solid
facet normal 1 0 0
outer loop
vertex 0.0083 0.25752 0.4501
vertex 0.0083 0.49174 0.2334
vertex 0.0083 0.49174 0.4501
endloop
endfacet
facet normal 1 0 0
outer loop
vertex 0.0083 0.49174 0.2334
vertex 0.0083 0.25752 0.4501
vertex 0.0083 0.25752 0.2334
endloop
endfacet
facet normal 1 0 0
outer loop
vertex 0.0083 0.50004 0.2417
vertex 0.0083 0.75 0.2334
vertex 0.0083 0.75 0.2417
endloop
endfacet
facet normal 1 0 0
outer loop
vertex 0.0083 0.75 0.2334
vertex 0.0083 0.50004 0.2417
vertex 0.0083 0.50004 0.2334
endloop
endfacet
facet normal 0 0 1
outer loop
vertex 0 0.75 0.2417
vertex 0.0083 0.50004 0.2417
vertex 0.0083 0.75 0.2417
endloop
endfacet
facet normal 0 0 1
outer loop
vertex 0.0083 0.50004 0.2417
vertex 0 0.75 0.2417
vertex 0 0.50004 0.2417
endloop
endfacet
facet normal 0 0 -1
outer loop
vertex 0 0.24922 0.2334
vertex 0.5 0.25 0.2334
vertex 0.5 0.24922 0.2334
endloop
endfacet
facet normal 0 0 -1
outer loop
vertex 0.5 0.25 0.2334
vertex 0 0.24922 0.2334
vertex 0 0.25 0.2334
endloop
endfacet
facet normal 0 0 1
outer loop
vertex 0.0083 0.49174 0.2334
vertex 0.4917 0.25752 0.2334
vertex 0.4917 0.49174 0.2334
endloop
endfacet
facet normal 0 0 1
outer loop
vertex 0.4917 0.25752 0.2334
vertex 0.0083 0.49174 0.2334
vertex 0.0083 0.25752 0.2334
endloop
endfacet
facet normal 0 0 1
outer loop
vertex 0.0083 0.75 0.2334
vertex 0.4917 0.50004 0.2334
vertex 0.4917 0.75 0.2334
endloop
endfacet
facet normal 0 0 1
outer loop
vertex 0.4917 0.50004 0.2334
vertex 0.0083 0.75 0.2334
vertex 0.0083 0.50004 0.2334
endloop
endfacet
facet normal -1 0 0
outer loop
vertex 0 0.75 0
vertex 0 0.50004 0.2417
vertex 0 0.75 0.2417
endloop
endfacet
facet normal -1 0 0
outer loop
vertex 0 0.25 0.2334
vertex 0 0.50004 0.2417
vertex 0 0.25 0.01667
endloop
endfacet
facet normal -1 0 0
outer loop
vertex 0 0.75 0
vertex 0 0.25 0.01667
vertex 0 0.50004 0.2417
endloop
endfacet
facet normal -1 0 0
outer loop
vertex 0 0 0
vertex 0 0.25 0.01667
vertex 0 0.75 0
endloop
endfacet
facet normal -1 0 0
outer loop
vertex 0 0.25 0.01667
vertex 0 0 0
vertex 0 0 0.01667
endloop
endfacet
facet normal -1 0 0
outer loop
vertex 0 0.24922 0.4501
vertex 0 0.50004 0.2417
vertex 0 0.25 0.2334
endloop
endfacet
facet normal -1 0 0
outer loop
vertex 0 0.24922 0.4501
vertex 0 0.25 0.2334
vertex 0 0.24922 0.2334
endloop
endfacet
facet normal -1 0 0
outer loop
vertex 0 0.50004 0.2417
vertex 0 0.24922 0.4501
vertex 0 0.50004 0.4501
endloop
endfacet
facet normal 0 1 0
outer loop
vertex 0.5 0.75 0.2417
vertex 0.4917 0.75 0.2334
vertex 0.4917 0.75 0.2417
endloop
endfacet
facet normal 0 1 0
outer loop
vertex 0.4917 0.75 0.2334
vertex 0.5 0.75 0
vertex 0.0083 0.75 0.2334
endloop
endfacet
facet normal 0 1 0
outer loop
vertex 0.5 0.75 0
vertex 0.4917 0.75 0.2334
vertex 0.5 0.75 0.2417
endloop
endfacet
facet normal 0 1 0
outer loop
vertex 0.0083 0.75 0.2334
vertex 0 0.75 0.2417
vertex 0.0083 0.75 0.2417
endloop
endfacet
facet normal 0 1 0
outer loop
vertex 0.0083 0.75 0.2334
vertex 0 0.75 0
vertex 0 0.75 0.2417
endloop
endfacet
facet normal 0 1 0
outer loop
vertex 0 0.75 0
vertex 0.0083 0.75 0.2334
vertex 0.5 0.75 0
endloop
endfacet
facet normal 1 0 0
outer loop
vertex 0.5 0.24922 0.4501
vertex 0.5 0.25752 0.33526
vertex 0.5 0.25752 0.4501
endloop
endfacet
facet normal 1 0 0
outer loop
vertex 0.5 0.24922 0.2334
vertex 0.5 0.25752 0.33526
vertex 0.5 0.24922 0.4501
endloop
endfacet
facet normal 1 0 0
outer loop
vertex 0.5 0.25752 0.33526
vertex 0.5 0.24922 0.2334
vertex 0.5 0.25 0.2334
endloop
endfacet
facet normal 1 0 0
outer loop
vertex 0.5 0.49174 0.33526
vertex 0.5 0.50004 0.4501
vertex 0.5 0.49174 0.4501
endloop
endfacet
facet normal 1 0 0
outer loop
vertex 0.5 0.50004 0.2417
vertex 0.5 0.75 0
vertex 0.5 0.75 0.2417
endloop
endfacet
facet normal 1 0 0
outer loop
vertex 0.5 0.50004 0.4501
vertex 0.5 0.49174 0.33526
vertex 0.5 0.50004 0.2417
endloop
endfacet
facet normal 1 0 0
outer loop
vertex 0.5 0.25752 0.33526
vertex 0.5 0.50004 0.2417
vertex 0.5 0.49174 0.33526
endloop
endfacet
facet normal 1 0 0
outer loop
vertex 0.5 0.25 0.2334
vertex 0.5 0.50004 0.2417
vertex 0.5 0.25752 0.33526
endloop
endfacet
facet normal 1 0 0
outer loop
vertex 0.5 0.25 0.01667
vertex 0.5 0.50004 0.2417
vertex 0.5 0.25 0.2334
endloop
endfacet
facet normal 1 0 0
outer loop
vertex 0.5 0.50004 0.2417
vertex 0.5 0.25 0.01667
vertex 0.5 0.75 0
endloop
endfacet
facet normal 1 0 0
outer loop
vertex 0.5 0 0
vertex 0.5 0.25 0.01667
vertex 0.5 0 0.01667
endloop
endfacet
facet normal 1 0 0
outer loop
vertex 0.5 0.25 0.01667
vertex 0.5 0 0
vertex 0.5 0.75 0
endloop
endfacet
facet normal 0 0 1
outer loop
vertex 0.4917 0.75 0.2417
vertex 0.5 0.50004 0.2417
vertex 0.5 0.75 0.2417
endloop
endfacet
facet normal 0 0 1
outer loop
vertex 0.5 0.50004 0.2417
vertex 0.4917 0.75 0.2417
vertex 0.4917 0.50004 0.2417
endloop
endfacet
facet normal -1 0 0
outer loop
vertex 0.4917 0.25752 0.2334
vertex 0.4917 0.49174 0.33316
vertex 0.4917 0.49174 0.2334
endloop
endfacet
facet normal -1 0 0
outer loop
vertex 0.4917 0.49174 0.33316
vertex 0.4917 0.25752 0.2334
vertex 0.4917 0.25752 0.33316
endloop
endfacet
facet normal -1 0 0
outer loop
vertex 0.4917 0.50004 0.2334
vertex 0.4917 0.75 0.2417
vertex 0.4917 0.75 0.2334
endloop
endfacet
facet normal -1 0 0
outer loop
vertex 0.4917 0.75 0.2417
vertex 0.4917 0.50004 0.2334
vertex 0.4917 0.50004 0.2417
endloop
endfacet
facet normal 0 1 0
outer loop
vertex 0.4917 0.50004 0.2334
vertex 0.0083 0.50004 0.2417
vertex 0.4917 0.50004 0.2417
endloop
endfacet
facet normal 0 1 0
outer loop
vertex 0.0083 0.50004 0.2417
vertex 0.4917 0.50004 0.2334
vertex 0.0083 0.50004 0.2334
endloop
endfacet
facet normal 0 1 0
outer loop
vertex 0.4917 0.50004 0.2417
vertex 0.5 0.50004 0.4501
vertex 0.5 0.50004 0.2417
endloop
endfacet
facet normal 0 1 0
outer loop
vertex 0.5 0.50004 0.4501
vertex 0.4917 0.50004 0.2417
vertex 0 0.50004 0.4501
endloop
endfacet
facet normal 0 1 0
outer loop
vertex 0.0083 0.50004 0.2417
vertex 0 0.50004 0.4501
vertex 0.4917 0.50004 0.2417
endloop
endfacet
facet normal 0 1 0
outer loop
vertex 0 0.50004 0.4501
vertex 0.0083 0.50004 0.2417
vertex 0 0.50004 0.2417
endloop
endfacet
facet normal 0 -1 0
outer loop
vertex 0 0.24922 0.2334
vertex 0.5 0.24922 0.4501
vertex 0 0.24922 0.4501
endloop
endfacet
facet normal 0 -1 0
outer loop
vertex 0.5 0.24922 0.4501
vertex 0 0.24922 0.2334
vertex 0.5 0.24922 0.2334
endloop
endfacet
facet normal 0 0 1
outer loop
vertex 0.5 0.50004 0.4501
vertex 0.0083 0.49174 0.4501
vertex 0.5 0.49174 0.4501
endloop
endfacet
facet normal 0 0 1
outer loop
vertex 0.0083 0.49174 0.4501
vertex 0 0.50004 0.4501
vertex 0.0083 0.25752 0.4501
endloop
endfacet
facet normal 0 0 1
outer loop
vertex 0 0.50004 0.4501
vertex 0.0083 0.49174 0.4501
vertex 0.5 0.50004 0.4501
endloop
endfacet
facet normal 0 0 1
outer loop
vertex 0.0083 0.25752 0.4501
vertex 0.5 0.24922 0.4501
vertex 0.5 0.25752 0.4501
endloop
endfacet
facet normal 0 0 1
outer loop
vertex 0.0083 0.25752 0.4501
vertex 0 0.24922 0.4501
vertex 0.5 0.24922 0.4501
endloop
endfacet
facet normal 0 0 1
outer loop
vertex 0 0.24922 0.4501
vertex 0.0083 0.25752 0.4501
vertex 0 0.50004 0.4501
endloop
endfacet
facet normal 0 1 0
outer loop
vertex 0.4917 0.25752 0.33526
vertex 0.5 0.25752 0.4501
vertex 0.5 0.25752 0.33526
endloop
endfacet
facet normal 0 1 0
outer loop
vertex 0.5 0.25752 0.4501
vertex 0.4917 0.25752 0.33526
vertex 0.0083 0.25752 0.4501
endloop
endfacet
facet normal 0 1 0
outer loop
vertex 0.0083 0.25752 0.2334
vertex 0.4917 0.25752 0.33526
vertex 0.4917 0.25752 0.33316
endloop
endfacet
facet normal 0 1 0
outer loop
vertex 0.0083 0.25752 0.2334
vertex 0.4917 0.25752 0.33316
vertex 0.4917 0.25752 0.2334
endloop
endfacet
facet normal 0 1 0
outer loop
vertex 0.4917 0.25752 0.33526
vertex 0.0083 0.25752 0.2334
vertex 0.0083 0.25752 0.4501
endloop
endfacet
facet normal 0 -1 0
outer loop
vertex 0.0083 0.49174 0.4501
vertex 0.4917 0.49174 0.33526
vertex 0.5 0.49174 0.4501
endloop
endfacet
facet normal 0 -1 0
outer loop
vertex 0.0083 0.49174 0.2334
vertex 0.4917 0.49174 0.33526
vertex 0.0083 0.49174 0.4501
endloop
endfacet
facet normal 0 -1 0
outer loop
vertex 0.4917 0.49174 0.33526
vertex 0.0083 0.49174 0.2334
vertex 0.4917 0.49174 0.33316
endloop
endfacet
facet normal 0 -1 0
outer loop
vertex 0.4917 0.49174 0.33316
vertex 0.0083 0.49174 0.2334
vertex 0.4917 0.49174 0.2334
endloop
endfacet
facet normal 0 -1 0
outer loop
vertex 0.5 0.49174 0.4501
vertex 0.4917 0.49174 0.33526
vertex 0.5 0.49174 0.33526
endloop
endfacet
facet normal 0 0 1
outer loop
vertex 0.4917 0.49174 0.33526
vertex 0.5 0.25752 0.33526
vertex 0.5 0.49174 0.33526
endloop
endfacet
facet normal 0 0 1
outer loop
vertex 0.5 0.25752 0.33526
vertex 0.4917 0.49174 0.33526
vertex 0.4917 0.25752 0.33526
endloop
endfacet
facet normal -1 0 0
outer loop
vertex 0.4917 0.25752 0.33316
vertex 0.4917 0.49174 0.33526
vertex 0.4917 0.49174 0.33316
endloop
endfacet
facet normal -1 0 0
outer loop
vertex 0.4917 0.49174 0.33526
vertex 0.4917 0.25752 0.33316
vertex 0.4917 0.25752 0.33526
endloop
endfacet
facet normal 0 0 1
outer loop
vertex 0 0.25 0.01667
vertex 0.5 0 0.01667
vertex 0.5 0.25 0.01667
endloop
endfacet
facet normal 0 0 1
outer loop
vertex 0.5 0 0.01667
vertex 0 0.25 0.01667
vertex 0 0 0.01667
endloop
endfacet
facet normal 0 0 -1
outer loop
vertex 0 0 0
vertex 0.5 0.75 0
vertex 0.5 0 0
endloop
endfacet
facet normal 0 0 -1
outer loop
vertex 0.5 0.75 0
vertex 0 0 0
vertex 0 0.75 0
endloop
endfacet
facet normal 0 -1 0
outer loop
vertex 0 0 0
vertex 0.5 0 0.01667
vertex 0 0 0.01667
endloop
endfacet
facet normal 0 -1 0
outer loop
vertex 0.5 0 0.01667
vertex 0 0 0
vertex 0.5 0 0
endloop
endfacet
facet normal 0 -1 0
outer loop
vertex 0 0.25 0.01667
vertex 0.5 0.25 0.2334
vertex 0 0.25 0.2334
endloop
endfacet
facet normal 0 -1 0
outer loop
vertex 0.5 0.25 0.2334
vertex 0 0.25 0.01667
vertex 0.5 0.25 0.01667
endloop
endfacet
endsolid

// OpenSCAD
// === Parameters ===

// Base reference slab
base_length    = 0.5;
base_width     = 0.75;
base_height    = 0.016667;

// Rear solid rectangular block (upper-side feature)
block_length   = 0.5;       // flush left & right
block_width    = 0.5;       // flush back, offset 0.25 from front
block_y_offset = 0.25;      // front-edge offset
block_reach    = 0.2334;    // total z from base datum

// Narrow edge strips atop rear block
strip_w        = 0.0083;    // x-width of each strip
strip_l        = 0.5;       // y-length (matches block_width)
strip_h        = 0.0083;    // z-extrusion depth

// Thin transverse plate
plate_length   = 0.5;       // x-extent, flush left & right
plate_width    = 0.250819;  // y-extent
plate_y_offset = 0.24922;   // offset from front edge
plate_thickness= 0.0021;    // own z-thickness
plate_reach    = 0.335265;  // top-surface z from base datum

// Frame wall thickness (matches strip width)
wall_t         = 0.0083;

// Stepped portion depths measured from shoulder (block top)
upper_pad_depth = 0.1;      // all 4 walls (shallow footprint)
deeper_depth    = 0.2167;   // left, front, back walls only

// === Derived Values ===
block_height   = block_reach - base_height;
plate_z_bottom = plate_reach - plate_thickness;
shoulder_z     = block_reach;

// Rectangular void inside thin plate (closed internal profile)
void_x   = wall_t;
void_y   = plate_y_offset + wall_t;
void_len = plate_length - 2 * wall_t;
void_wid = plate_width  - 2 * wall_t;

eps = 0.001;
$fn = 60;

// === Modules ===

// 1. Main reference slab
module base_slab() {
    cube([base_length, base_width, base_height]);
}

// 2. Upper-side solid rectangular feature on rear half
module rear_block() {
    translate([0, block_y_offset, base_height])
        cube([block_length, block_width, block_height]);
}

// 3. Two narrow edge strips on top of rear block
module edge_strips() {
    // Left strip – flush with left edge
    translate([0, block_y_offset, block_reach])
        cube([strip_w, strip_l, strip_h]);
    // Right strip – flush with right edge
    translate([base_length - strip_w, block_y_offset, block_reach])
        cube([strip_w, strip_l, strip_h]);
}

// 4. Stepped frame walls (upper pad + deeper continuation)
//    Connects block top to thin plate; acts as perimeter support.
module stepped_walls() {
    // --- Upper pad (shallow footprint, right wall only) ---
    right_h = plate_z_bottom - shoulder_z;   // ~0.1
    translate([plate_length - wall_t, plate_y_offset, shoulder_z])
        cube([wall_t, plate_width, right_h]);

    // --- Deeper continuation (left, front, back walls) ---
    // Left wall
    translate([0, plate_y_offset, shoulder_z])
        cube([wall_t, plate_width, deeper_depth]);
    // Front wall (full x-span)
    translate([0, plate_y_offset, shoulder_z])
        cube([plate_length, wall_t, deeper_depth]);
    // Back wall (full x-span)
    translate([0, plate_y_offset + plate_width - wall_t, shoulder_z])
        cube([plate_length, wall_t, deeper_depth]);
}

// 5. Thin transverse plate with closed-profile void
module thin_plate() {
    difference() {
        // Solid plate
        translate([0, plate_y_offset, plate_z_bottom])
            cube([plate_length, plate_width, plate_thickness]);
        // Open void (rectangular through-hole)
        translate([void_x, void_y, plate_z_bottom - eps])
            cube([void_len, void_wid, plate_thickness + 2 * eps]);
    }
}

// === Final Assembly ===
union() {
    base_slab();
    rear_block();
    edge_strips();
    stepped_walls();
    thin_plate();
}
